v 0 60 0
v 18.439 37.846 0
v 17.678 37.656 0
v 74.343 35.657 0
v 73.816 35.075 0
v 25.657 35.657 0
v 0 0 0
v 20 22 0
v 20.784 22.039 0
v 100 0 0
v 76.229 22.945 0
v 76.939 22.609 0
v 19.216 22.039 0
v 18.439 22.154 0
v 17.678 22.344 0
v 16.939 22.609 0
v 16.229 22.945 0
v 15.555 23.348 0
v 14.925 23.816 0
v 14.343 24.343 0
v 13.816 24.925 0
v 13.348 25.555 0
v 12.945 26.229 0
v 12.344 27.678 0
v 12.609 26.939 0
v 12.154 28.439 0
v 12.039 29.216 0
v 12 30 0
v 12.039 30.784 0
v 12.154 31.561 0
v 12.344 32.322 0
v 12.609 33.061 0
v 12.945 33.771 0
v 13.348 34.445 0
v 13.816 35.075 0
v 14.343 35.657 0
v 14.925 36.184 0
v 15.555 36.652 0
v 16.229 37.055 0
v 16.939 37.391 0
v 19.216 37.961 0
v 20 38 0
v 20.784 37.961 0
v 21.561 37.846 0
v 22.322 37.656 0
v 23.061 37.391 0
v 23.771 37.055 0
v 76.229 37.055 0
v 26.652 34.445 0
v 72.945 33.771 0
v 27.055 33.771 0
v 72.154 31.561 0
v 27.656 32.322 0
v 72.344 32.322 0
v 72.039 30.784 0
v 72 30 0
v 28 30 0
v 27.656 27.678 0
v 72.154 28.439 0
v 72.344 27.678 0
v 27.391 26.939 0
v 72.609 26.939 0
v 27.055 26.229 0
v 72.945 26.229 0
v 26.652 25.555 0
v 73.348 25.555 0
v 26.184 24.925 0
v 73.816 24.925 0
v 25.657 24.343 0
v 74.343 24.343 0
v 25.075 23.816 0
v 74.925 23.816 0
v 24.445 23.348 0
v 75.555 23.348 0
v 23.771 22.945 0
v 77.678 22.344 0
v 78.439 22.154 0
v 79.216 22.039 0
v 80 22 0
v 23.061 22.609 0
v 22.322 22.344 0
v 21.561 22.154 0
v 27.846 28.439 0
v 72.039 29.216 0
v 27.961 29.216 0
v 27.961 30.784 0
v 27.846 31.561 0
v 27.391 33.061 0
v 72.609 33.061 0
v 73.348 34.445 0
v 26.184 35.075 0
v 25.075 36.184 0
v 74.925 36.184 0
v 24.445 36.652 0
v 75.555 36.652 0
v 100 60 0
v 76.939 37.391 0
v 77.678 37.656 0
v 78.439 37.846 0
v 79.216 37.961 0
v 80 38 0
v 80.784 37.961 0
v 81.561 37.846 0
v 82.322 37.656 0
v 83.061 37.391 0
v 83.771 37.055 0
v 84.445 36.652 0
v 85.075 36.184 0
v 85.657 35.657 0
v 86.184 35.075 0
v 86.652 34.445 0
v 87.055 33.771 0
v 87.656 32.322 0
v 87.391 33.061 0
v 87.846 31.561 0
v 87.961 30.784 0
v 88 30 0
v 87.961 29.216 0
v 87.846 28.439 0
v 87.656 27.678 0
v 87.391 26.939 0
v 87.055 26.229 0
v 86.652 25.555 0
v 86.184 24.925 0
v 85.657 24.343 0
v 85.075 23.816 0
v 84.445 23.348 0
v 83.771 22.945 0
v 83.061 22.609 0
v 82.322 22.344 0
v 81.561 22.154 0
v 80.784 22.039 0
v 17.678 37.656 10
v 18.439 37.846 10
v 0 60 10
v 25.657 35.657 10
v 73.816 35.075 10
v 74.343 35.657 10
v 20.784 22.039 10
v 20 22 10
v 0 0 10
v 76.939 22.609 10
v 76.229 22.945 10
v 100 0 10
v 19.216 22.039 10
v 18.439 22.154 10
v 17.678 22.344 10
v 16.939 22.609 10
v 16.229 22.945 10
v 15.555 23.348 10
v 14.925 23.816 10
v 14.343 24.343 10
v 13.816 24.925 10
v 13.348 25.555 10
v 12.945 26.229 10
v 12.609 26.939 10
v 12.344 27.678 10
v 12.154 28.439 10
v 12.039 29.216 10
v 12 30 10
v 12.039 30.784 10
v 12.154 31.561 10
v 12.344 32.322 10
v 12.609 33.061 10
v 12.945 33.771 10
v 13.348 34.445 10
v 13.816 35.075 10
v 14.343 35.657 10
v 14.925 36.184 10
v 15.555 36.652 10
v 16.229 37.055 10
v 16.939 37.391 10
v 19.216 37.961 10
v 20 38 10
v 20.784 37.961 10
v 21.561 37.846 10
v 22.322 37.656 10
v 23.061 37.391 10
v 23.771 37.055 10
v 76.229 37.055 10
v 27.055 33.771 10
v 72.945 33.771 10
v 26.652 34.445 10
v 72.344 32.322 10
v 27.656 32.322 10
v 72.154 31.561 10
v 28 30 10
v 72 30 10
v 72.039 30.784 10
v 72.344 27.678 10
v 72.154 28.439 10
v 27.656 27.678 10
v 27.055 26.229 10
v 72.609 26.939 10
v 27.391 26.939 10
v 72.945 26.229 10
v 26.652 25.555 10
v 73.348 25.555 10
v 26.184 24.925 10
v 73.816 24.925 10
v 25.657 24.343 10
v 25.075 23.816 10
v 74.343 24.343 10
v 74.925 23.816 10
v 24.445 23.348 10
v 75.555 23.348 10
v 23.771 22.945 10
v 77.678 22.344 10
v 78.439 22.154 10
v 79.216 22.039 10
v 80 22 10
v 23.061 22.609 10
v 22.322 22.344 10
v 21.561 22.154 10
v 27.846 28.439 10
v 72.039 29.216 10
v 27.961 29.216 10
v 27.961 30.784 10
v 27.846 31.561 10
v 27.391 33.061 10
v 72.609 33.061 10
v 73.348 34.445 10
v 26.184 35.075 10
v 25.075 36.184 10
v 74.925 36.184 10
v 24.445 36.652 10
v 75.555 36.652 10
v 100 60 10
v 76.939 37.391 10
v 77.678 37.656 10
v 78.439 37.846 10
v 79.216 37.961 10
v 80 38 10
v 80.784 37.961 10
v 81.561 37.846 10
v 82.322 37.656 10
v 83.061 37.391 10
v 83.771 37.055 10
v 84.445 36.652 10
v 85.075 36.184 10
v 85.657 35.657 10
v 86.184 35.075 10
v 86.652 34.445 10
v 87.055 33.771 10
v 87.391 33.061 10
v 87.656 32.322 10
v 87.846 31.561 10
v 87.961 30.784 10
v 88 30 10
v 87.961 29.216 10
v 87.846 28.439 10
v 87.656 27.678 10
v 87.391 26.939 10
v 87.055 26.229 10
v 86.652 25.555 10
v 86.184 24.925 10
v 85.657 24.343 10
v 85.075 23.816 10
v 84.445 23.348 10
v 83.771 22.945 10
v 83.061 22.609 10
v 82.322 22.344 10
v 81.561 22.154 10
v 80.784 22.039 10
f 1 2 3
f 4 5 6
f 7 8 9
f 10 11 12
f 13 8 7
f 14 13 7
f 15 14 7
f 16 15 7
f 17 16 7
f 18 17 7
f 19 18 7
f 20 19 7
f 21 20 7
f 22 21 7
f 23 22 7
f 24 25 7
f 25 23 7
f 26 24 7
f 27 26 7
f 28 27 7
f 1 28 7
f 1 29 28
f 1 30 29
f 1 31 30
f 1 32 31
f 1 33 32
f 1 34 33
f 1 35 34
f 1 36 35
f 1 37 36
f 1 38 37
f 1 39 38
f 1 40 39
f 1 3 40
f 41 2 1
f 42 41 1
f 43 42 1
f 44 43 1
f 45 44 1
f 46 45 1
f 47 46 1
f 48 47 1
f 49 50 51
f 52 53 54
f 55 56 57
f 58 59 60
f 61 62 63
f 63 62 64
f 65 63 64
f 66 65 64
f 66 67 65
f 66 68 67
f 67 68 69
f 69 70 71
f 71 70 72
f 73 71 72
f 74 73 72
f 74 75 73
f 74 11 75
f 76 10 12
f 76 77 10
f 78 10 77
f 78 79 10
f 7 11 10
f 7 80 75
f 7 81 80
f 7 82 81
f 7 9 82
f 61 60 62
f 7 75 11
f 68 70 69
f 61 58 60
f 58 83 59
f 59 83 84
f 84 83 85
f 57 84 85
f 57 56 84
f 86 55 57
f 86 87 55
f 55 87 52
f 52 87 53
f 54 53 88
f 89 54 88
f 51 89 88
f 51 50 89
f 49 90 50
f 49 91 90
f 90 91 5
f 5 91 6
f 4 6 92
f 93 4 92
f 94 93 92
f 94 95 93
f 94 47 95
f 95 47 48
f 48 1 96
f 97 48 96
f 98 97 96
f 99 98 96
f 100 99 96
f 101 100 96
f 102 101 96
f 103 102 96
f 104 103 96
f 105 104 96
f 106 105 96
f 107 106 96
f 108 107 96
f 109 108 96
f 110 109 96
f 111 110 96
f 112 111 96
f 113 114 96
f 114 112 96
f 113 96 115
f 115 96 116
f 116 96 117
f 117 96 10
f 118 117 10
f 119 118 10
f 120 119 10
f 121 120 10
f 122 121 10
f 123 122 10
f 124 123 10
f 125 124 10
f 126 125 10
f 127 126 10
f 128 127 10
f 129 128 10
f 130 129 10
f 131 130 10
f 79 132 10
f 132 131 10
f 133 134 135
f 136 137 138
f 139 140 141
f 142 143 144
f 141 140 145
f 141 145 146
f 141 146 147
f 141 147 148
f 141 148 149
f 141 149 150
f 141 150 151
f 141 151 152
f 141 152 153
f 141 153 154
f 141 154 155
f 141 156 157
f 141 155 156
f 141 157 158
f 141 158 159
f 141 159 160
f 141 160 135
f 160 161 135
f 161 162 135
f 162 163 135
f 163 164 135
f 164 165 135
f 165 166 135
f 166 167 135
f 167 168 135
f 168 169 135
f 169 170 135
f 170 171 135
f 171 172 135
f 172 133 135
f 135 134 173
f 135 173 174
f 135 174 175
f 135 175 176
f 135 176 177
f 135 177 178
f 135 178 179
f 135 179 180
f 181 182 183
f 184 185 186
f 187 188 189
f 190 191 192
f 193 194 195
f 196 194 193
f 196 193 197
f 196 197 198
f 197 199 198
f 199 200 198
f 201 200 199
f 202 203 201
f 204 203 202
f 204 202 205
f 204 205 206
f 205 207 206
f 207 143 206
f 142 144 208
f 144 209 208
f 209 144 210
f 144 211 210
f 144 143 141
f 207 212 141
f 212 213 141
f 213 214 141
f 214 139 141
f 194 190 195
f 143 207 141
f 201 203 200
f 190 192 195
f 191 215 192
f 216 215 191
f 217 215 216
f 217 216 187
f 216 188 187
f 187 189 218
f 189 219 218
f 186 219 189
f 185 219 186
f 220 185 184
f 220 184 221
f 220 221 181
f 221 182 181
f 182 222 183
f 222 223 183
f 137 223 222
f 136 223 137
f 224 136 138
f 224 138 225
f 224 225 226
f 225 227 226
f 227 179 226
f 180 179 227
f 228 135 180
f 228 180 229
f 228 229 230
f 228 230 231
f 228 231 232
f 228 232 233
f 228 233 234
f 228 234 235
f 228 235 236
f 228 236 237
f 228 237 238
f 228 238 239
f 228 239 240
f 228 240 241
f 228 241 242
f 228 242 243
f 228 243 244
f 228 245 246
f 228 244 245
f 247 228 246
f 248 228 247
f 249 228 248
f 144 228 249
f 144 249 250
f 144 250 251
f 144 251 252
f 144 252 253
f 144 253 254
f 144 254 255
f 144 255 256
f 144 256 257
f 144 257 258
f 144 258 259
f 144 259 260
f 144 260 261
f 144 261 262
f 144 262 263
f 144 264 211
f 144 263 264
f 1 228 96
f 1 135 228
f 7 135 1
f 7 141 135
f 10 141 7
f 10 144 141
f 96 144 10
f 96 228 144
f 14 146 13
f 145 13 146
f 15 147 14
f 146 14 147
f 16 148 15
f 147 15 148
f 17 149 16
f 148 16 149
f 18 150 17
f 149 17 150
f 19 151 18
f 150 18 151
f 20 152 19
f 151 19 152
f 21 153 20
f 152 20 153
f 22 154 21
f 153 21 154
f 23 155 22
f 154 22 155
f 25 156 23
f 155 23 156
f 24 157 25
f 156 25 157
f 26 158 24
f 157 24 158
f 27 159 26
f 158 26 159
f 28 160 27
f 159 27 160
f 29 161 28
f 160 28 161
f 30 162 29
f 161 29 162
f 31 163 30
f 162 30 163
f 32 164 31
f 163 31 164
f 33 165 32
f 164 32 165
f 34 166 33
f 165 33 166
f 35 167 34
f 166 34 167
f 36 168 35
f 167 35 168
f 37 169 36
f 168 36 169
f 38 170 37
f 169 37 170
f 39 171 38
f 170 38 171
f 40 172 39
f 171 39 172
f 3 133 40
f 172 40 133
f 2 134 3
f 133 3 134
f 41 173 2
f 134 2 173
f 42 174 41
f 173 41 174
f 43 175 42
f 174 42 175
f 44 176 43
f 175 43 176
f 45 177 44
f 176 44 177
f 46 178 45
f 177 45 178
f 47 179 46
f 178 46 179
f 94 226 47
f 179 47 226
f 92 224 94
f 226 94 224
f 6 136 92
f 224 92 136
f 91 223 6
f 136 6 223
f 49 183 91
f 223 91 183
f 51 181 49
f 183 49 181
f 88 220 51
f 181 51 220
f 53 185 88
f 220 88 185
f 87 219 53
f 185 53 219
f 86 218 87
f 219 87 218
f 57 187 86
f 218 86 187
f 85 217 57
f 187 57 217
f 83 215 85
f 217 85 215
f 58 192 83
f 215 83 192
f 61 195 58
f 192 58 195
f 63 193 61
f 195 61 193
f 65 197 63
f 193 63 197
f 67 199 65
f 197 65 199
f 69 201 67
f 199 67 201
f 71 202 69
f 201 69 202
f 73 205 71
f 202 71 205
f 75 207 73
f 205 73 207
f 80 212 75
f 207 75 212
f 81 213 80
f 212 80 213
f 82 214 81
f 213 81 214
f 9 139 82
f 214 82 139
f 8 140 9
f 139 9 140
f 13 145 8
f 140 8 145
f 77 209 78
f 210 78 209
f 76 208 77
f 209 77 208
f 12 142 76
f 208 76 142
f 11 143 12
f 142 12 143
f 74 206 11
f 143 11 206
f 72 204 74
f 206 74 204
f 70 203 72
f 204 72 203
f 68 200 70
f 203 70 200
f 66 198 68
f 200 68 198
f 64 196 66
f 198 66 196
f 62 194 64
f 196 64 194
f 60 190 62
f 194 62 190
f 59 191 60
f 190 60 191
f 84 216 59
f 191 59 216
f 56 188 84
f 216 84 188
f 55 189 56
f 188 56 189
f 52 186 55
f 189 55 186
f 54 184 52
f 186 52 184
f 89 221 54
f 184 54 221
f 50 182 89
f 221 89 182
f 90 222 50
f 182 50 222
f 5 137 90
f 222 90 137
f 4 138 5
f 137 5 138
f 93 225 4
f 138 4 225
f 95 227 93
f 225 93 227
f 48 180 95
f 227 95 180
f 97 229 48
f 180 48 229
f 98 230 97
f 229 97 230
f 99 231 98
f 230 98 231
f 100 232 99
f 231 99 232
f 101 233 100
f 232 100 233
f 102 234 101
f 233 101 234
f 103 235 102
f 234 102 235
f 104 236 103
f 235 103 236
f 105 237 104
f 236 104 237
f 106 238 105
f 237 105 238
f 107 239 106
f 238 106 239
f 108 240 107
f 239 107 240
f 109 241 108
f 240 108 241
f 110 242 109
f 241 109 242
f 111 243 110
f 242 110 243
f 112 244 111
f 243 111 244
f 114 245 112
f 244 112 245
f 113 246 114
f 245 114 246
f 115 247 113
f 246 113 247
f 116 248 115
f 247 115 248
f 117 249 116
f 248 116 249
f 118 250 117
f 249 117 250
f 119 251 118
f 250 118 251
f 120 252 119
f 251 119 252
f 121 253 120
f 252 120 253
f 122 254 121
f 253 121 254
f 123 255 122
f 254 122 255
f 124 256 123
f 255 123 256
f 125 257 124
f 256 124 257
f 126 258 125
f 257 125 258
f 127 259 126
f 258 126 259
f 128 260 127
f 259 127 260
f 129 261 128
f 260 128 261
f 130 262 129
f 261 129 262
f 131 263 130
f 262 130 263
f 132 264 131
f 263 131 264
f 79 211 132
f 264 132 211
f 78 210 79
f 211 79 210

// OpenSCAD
linear_extrude(height = 10)
  difference() {
    square([100, 60]);
    translate([20, 30]) circle(r = 8, $fn = 64);
    translate([80, 30]) circle(r = 8, $fn = 64);
  }
